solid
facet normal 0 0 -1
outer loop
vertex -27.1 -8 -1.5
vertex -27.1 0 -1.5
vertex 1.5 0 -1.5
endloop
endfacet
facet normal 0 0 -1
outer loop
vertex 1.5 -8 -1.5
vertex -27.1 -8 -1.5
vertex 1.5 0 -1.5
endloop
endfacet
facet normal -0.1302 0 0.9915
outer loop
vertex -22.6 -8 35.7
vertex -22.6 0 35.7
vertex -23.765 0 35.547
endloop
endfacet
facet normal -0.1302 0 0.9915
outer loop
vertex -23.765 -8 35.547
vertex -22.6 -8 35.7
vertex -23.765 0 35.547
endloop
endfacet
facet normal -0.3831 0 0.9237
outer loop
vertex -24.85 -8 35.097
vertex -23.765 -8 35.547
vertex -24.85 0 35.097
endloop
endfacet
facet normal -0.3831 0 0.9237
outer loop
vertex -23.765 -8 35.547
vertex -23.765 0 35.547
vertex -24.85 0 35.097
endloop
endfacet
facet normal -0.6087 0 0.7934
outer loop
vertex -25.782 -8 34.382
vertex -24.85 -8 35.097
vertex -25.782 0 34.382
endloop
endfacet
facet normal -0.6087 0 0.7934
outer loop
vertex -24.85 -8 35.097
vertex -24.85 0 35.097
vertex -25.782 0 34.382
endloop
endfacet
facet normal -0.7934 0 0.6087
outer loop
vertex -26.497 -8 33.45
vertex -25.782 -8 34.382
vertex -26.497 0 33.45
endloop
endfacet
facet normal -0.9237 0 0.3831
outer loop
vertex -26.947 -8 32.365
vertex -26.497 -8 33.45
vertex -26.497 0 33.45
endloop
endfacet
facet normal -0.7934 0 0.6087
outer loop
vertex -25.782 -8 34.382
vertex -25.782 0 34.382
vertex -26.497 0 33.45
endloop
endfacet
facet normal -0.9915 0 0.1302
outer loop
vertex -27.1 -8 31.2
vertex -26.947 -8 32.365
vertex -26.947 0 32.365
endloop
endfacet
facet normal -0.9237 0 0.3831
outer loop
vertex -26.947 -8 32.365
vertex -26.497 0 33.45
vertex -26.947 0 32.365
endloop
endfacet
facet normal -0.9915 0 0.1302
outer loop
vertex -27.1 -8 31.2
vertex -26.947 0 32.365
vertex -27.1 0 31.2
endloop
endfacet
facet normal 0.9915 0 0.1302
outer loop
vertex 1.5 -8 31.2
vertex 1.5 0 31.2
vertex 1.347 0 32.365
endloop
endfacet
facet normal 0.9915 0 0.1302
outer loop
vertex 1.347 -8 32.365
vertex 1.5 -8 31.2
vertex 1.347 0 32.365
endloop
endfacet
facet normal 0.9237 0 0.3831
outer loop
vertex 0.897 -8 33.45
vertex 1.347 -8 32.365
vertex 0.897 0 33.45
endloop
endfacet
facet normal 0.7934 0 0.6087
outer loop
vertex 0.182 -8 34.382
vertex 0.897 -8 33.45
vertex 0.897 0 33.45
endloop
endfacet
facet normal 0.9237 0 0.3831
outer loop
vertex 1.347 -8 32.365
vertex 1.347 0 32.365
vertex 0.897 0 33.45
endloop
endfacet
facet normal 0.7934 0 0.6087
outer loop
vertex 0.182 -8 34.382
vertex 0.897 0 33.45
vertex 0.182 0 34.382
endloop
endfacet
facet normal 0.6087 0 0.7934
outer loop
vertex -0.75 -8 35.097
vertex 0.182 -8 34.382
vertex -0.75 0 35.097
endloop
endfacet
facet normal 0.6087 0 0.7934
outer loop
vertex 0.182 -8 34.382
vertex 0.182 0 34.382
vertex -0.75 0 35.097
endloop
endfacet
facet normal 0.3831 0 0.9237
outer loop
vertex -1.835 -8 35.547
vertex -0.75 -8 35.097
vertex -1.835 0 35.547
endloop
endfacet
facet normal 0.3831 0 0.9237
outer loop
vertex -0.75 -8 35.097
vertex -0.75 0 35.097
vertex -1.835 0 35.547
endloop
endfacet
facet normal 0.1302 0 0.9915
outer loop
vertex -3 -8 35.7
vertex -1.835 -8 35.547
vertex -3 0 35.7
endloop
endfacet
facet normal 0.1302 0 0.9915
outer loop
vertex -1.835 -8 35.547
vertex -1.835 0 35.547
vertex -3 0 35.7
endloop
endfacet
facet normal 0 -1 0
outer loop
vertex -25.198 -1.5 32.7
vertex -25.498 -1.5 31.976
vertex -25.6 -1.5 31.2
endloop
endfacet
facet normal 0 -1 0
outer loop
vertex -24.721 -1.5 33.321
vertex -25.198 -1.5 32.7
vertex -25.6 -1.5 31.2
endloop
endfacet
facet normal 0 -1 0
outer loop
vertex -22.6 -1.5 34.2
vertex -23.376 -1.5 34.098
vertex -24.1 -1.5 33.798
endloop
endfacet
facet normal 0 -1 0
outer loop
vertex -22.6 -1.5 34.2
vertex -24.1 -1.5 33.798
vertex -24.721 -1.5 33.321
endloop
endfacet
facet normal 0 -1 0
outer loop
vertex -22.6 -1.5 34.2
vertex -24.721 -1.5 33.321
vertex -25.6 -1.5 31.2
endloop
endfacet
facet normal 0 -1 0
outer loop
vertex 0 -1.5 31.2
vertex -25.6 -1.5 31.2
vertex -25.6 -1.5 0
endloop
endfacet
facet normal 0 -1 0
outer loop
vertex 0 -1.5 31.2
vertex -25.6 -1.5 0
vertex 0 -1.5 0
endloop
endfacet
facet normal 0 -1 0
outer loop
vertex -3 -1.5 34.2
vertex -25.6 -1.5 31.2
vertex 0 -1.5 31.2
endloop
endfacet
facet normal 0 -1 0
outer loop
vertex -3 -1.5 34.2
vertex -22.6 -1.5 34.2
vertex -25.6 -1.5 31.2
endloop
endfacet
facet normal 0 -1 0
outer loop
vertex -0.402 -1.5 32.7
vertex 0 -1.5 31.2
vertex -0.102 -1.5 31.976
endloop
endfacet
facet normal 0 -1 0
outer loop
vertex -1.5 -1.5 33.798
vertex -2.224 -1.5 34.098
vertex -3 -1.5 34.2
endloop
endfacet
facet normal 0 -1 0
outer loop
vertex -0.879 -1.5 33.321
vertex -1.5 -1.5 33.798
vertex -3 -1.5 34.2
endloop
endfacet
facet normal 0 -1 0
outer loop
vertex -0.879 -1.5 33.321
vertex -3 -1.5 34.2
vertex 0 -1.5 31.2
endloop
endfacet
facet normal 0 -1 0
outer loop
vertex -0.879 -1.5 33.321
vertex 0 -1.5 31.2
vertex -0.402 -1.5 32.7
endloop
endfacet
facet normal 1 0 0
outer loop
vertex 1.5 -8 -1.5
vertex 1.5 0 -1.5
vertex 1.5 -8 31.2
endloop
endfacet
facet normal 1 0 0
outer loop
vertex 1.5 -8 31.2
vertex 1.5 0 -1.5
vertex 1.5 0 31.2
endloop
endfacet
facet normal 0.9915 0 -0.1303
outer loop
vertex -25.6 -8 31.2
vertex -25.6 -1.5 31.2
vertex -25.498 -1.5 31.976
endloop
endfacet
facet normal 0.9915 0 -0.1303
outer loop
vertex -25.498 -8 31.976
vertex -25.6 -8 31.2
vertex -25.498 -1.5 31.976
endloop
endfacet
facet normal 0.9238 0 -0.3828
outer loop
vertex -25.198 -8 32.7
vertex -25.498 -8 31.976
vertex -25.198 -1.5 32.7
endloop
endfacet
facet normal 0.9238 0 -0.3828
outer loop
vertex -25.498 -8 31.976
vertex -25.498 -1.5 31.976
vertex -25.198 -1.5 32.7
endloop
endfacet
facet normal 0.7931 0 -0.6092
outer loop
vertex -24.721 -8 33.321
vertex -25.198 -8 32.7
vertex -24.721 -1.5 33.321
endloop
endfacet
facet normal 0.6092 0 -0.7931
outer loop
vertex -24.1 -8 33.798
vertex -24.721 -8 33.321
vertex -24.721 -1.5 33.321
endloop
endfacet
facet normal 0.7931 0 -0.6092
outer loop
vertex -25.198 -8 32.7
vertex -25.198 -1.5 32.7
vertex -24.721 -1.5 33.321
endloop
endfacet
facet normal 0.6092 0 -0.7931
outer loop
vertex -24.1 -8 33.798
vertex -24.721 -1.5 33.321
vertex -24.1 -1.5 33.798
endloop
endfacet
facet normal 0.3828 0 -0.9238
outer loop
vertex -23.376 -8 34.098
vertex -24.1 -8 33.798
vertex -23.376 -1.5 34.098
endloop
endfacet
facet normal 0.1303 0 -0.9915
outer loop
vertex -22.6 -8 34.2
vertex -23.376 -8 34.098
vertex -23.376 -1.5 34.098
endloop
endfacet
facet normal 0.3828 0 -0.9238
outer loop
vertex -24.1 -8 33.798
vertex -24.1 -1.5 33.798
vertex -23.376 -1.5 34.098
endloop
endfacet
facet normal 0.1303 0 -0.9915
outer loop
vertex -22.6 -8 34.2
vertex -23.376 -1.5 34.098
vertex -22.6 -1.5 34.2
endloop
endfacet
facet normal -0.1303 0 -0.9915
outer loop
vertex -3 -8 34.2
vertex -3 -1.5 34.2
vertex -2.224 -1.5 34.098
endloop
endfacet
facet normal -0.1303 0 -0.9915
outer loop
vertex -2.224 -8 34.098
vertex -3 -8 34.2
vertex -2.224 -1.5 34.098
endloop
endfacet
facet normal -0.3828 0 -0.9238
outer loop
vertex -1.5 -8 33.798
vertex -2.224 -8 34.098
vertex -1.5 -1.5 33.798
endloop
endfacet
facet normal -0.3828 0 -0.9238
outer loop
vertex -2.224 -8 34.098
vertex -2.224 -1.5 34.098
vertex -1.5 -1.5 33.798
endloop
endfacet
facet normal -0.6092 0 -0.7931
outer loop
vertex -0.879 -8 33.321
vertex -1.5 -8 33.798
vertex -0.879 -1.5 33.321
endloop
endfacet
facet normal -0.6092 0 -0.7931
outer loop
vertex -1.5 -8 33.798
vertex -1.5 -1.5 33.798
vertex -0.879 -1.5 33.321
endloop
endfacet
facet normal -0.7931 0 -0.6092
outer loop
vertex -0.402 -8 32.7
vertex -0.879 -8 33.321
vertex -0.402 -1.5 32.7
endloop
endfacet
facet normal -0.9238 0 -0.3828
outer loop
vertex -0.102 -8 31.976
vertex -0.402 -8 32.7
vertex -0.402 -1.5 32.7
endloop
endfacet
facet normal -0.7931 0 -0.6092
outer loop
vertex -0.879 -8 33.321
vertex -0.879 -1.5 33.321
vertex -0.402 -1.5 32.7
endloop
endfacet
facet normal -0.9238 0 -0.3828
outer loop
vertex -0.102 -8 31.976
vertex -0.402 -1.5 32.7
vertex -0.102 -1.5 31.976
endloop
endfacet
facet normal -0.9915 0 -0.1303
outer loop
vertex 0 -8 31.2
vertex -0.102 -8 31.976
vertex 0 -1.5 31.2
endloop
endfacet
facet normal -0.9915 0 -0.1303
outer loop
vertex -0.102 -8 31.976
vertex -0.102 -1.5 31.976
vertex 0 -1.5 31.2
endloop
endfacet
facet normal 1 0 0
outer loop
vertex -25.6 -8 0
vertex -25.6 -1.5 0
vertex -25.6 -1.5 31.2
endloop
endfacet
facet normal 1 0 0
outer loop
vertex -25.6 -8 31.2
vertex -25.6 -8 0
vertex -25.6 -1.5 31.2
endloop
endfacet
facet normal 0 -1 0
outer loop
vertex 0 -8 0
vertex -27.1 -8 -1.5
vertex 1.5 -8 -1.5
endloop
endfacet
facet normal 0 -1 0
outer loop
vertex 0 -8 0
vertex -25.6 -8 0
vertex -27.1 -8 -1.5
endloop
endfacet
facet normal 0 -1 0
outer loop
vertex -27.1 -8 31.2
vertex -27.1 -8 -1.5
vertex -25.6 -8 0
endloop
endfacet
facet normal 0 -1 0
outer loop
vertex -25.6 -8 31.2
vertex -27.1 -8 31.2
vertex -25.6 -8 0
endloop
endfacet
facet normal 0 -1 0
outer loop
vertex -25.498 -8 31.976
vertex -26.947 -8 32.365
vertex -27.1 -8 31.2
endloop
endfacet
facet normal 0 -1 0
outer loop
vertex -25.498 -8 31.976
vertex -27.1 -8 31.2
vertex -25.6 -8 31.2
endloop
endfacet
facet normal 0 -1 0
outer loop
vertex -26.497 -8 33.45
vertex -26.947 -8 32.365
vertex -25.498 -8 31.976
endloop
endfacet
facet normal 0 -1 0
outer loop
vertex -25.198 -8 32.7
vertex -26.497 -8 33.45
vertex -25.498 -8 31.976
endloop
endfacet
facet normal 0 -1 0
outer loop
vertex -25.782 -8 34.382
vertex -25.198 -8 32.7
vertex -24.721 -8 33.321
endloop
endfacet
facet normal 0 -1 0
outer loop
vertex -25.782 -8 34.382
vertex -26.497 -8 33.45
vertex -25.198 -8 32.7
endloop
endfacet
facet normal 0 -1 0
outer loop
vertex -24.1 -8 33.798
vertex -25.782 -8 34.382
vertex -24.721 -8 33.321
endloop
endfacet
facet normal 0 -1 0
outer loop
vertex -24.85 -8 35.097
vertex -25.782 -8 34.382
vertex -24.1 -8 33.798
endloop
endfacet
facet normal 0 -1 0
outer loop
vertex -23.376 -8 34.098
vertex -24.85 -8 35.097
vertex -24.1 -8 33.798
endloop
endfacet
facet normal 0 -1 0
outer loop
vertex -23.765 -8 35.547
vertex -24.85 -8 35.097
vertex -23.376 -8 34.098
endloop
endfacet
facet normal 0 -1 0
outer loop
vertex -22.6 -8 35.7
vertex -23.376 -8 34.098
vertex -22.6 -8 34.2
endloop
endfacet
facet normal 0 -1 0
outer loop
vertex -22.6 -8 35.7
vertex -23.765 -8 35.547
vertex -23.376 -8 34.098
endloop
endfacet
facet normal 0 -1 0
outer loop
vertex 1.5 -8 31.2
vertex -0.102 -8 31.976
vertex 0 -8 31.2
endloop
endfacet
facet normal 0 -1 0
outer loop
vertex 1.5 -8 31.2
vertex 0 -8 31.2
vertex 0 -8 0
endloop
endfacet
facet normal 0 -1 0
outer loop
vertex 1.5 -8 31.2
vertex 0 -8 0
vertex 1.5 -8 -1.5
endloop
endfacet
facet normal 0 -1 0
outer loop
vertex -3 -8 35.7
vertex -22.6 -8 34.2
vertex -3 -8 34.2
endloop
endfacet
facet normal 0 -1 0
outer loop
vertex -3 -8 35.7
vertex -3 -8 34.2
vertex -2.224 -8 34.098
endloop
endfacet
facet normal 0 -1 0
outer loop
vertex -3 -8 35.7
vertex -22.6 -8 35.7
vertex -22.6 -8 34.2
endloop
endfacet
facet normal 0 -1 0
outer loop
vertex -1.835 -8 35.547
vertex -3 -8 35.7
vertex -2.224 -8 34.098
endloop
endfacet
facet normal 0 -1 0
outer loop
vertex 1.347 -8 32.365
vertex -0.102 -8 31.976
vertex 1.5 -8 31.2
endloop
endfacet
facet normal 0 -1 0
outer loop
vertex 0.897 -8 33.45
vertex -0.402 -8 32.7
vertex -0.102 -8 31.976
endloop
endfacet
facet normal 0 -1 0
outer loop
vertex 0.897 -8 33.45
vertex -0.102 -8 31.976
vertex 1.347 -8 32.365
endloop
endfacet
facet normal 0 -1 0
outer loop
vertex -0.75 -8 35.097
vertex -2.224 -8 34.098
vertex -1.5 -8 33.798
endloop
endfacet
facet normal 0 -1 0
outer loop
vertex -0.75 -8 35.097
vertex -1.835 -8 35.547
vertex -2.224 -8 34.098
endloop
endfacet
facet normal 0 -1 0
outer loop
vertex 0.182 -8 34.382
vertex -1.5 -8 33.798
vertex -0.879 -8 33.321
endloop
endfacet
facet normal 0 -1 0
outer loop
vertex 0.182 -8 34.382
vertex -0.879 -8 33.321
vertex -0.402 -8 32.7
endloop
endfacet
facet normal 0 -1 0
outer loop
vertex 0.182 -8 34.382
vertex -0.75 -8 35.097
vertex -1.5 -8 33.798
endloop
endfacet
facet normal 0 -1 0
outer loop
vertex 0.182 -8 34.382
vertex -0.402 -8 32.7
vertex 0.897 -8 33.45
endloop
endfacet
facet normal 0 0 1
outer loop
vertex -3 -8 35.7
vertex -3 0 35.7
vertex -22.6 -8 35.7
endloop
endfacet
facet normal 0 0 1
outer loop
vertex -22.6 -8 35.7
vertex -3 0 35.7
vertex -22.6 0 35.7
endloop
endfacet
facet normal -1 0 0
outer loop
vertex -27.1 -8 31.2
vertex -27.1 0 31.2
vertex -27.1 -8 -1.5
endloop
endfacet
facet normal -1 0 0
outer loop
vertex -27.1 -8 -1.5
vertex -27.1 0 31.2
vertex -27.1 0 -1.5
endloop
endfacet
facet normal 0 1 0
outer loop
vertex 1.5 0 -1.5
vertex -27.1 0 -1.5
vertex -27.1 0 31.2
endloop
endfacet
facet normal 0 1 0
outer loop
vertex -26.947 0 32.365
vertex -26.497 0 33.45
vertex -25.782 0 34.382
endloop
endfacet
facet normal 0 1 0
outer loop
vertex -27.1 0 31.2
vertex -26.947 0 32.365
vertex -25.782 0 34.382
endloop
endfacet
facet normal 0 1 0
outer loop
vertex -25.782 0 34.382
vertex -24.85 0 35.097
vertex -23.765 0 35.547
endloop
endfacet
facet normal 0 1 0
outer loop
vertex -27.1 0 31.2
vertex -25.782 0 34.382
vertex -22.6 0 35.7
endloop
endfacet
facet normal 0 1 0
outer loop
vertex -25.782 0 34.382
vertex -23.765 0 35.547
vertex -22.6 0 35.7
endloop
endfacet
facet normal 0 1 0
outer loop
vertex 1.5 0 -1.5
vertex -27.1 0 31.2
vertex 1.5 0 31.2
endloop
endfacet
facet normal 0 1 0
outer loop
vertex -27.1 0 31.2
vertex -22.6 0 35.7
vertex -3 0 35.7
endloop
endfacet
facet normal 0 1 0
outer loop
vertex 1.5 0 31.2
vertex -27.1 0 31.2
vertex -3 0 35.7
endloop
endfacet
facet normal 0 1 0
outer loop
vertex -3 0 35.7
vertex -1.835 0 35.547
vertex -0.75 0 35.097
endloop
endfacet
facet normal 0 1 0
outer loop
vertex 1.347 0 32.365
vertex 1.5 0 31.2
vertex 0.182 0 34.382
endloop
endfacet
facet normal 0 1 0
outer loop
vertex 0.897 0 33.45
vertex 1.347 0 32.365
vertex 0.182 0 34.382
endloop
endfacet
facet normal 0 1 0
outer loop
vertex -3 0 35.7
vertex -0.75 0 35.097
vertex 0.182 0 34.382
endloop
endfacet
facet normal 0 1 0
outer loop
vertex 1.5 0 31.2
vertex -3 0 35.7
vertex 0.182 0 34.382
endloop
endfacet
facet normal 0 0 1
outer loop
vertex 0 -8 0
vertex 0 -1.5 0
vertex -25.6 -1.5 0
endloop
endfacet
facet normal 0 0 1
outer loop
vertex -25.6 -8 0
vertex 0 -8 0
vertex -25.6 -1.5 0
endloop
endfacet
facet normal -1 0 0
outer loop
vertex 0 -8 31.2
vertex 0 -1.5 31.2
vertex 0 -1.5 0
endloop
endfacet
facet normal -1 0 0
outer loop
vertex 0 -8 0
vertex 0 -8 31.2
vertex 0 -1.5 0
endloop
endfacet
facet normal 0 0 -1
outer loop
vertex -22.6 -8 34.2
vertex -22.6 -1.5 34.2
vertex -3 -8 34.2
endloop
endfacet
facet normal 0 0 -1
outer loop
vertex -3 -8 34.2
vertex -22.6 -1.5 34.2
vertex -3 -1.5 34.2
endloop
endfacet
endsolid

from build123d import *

# Parameters (mm, degrees)
F1_DEPTH = 8
F2_DEPTH = 1.5


# Not quite as in the source:
# - a feature names something its author has since deleted; it is built from what else it names


with BuildPart() as f1:
    # F0 (on Front) → F1 (new body)
    with BuildSketch(Plane.XZ):
        with BuildLine():
            Line((-27.1, 31.2), (-27.1, -1.5))
            Line((-27.1, -1.5), (1.5, -1.5))
            Line((1.5, -1.5), (1.5, 31.2))
            ThreePointArc((1.5, 31.2), (0.1819805153, 34.3819805153), (-3, 35.7))
            Line((-3, 35.7), (-22.6, 35.7))
            ThreePointArc((-22.6, 35.7), (-25.7819805153, 34.3819805153), (-27.1, 31.2))
        make_face()
        with BuildLine():
            ThreePointArc((-25.6, 31.2), (-24.7213203436, 33.3213203436), (-22.6, 34.2))
            Line((-22.6, 34.2), (-3, 34.2))
            ThreePointArc((-3, 34.2), (-0.8786796564, 33.3213203436), (0, 31.2))
            Line((0, 31.2), (0, 0))
            Line((0, 0), (-25.6, 0))
            Line((-25.6, 0), (-25.6, 31.2))
        make_face(mode=Mode.SUBTRACT)
    extrude(amount=F1_DEPTH)

    # F0 (on Front) → F2 (join)
    with BuildSketch(Plane.XZ):
        with BuildLine():
            Line((-3, 34.2), (-22.6, 34.2))
            ThreePointArc((-22.6, 34.2), (-24.7213203436, 33.3213203436), (-25.6, 31.2))
            Line((-25.6, 31.2), (-25.6, 0))
            Line((-25.6, 0), (0, 0))
            Line((0, 0), (0, 31.2))
            ThreePointArc((0, 31.2), (-0.8786796564, 33.3213203436), (-3, 34.2))
        make_face()
    extrude(amount=F2_DEPTH)


solid = f1.part
